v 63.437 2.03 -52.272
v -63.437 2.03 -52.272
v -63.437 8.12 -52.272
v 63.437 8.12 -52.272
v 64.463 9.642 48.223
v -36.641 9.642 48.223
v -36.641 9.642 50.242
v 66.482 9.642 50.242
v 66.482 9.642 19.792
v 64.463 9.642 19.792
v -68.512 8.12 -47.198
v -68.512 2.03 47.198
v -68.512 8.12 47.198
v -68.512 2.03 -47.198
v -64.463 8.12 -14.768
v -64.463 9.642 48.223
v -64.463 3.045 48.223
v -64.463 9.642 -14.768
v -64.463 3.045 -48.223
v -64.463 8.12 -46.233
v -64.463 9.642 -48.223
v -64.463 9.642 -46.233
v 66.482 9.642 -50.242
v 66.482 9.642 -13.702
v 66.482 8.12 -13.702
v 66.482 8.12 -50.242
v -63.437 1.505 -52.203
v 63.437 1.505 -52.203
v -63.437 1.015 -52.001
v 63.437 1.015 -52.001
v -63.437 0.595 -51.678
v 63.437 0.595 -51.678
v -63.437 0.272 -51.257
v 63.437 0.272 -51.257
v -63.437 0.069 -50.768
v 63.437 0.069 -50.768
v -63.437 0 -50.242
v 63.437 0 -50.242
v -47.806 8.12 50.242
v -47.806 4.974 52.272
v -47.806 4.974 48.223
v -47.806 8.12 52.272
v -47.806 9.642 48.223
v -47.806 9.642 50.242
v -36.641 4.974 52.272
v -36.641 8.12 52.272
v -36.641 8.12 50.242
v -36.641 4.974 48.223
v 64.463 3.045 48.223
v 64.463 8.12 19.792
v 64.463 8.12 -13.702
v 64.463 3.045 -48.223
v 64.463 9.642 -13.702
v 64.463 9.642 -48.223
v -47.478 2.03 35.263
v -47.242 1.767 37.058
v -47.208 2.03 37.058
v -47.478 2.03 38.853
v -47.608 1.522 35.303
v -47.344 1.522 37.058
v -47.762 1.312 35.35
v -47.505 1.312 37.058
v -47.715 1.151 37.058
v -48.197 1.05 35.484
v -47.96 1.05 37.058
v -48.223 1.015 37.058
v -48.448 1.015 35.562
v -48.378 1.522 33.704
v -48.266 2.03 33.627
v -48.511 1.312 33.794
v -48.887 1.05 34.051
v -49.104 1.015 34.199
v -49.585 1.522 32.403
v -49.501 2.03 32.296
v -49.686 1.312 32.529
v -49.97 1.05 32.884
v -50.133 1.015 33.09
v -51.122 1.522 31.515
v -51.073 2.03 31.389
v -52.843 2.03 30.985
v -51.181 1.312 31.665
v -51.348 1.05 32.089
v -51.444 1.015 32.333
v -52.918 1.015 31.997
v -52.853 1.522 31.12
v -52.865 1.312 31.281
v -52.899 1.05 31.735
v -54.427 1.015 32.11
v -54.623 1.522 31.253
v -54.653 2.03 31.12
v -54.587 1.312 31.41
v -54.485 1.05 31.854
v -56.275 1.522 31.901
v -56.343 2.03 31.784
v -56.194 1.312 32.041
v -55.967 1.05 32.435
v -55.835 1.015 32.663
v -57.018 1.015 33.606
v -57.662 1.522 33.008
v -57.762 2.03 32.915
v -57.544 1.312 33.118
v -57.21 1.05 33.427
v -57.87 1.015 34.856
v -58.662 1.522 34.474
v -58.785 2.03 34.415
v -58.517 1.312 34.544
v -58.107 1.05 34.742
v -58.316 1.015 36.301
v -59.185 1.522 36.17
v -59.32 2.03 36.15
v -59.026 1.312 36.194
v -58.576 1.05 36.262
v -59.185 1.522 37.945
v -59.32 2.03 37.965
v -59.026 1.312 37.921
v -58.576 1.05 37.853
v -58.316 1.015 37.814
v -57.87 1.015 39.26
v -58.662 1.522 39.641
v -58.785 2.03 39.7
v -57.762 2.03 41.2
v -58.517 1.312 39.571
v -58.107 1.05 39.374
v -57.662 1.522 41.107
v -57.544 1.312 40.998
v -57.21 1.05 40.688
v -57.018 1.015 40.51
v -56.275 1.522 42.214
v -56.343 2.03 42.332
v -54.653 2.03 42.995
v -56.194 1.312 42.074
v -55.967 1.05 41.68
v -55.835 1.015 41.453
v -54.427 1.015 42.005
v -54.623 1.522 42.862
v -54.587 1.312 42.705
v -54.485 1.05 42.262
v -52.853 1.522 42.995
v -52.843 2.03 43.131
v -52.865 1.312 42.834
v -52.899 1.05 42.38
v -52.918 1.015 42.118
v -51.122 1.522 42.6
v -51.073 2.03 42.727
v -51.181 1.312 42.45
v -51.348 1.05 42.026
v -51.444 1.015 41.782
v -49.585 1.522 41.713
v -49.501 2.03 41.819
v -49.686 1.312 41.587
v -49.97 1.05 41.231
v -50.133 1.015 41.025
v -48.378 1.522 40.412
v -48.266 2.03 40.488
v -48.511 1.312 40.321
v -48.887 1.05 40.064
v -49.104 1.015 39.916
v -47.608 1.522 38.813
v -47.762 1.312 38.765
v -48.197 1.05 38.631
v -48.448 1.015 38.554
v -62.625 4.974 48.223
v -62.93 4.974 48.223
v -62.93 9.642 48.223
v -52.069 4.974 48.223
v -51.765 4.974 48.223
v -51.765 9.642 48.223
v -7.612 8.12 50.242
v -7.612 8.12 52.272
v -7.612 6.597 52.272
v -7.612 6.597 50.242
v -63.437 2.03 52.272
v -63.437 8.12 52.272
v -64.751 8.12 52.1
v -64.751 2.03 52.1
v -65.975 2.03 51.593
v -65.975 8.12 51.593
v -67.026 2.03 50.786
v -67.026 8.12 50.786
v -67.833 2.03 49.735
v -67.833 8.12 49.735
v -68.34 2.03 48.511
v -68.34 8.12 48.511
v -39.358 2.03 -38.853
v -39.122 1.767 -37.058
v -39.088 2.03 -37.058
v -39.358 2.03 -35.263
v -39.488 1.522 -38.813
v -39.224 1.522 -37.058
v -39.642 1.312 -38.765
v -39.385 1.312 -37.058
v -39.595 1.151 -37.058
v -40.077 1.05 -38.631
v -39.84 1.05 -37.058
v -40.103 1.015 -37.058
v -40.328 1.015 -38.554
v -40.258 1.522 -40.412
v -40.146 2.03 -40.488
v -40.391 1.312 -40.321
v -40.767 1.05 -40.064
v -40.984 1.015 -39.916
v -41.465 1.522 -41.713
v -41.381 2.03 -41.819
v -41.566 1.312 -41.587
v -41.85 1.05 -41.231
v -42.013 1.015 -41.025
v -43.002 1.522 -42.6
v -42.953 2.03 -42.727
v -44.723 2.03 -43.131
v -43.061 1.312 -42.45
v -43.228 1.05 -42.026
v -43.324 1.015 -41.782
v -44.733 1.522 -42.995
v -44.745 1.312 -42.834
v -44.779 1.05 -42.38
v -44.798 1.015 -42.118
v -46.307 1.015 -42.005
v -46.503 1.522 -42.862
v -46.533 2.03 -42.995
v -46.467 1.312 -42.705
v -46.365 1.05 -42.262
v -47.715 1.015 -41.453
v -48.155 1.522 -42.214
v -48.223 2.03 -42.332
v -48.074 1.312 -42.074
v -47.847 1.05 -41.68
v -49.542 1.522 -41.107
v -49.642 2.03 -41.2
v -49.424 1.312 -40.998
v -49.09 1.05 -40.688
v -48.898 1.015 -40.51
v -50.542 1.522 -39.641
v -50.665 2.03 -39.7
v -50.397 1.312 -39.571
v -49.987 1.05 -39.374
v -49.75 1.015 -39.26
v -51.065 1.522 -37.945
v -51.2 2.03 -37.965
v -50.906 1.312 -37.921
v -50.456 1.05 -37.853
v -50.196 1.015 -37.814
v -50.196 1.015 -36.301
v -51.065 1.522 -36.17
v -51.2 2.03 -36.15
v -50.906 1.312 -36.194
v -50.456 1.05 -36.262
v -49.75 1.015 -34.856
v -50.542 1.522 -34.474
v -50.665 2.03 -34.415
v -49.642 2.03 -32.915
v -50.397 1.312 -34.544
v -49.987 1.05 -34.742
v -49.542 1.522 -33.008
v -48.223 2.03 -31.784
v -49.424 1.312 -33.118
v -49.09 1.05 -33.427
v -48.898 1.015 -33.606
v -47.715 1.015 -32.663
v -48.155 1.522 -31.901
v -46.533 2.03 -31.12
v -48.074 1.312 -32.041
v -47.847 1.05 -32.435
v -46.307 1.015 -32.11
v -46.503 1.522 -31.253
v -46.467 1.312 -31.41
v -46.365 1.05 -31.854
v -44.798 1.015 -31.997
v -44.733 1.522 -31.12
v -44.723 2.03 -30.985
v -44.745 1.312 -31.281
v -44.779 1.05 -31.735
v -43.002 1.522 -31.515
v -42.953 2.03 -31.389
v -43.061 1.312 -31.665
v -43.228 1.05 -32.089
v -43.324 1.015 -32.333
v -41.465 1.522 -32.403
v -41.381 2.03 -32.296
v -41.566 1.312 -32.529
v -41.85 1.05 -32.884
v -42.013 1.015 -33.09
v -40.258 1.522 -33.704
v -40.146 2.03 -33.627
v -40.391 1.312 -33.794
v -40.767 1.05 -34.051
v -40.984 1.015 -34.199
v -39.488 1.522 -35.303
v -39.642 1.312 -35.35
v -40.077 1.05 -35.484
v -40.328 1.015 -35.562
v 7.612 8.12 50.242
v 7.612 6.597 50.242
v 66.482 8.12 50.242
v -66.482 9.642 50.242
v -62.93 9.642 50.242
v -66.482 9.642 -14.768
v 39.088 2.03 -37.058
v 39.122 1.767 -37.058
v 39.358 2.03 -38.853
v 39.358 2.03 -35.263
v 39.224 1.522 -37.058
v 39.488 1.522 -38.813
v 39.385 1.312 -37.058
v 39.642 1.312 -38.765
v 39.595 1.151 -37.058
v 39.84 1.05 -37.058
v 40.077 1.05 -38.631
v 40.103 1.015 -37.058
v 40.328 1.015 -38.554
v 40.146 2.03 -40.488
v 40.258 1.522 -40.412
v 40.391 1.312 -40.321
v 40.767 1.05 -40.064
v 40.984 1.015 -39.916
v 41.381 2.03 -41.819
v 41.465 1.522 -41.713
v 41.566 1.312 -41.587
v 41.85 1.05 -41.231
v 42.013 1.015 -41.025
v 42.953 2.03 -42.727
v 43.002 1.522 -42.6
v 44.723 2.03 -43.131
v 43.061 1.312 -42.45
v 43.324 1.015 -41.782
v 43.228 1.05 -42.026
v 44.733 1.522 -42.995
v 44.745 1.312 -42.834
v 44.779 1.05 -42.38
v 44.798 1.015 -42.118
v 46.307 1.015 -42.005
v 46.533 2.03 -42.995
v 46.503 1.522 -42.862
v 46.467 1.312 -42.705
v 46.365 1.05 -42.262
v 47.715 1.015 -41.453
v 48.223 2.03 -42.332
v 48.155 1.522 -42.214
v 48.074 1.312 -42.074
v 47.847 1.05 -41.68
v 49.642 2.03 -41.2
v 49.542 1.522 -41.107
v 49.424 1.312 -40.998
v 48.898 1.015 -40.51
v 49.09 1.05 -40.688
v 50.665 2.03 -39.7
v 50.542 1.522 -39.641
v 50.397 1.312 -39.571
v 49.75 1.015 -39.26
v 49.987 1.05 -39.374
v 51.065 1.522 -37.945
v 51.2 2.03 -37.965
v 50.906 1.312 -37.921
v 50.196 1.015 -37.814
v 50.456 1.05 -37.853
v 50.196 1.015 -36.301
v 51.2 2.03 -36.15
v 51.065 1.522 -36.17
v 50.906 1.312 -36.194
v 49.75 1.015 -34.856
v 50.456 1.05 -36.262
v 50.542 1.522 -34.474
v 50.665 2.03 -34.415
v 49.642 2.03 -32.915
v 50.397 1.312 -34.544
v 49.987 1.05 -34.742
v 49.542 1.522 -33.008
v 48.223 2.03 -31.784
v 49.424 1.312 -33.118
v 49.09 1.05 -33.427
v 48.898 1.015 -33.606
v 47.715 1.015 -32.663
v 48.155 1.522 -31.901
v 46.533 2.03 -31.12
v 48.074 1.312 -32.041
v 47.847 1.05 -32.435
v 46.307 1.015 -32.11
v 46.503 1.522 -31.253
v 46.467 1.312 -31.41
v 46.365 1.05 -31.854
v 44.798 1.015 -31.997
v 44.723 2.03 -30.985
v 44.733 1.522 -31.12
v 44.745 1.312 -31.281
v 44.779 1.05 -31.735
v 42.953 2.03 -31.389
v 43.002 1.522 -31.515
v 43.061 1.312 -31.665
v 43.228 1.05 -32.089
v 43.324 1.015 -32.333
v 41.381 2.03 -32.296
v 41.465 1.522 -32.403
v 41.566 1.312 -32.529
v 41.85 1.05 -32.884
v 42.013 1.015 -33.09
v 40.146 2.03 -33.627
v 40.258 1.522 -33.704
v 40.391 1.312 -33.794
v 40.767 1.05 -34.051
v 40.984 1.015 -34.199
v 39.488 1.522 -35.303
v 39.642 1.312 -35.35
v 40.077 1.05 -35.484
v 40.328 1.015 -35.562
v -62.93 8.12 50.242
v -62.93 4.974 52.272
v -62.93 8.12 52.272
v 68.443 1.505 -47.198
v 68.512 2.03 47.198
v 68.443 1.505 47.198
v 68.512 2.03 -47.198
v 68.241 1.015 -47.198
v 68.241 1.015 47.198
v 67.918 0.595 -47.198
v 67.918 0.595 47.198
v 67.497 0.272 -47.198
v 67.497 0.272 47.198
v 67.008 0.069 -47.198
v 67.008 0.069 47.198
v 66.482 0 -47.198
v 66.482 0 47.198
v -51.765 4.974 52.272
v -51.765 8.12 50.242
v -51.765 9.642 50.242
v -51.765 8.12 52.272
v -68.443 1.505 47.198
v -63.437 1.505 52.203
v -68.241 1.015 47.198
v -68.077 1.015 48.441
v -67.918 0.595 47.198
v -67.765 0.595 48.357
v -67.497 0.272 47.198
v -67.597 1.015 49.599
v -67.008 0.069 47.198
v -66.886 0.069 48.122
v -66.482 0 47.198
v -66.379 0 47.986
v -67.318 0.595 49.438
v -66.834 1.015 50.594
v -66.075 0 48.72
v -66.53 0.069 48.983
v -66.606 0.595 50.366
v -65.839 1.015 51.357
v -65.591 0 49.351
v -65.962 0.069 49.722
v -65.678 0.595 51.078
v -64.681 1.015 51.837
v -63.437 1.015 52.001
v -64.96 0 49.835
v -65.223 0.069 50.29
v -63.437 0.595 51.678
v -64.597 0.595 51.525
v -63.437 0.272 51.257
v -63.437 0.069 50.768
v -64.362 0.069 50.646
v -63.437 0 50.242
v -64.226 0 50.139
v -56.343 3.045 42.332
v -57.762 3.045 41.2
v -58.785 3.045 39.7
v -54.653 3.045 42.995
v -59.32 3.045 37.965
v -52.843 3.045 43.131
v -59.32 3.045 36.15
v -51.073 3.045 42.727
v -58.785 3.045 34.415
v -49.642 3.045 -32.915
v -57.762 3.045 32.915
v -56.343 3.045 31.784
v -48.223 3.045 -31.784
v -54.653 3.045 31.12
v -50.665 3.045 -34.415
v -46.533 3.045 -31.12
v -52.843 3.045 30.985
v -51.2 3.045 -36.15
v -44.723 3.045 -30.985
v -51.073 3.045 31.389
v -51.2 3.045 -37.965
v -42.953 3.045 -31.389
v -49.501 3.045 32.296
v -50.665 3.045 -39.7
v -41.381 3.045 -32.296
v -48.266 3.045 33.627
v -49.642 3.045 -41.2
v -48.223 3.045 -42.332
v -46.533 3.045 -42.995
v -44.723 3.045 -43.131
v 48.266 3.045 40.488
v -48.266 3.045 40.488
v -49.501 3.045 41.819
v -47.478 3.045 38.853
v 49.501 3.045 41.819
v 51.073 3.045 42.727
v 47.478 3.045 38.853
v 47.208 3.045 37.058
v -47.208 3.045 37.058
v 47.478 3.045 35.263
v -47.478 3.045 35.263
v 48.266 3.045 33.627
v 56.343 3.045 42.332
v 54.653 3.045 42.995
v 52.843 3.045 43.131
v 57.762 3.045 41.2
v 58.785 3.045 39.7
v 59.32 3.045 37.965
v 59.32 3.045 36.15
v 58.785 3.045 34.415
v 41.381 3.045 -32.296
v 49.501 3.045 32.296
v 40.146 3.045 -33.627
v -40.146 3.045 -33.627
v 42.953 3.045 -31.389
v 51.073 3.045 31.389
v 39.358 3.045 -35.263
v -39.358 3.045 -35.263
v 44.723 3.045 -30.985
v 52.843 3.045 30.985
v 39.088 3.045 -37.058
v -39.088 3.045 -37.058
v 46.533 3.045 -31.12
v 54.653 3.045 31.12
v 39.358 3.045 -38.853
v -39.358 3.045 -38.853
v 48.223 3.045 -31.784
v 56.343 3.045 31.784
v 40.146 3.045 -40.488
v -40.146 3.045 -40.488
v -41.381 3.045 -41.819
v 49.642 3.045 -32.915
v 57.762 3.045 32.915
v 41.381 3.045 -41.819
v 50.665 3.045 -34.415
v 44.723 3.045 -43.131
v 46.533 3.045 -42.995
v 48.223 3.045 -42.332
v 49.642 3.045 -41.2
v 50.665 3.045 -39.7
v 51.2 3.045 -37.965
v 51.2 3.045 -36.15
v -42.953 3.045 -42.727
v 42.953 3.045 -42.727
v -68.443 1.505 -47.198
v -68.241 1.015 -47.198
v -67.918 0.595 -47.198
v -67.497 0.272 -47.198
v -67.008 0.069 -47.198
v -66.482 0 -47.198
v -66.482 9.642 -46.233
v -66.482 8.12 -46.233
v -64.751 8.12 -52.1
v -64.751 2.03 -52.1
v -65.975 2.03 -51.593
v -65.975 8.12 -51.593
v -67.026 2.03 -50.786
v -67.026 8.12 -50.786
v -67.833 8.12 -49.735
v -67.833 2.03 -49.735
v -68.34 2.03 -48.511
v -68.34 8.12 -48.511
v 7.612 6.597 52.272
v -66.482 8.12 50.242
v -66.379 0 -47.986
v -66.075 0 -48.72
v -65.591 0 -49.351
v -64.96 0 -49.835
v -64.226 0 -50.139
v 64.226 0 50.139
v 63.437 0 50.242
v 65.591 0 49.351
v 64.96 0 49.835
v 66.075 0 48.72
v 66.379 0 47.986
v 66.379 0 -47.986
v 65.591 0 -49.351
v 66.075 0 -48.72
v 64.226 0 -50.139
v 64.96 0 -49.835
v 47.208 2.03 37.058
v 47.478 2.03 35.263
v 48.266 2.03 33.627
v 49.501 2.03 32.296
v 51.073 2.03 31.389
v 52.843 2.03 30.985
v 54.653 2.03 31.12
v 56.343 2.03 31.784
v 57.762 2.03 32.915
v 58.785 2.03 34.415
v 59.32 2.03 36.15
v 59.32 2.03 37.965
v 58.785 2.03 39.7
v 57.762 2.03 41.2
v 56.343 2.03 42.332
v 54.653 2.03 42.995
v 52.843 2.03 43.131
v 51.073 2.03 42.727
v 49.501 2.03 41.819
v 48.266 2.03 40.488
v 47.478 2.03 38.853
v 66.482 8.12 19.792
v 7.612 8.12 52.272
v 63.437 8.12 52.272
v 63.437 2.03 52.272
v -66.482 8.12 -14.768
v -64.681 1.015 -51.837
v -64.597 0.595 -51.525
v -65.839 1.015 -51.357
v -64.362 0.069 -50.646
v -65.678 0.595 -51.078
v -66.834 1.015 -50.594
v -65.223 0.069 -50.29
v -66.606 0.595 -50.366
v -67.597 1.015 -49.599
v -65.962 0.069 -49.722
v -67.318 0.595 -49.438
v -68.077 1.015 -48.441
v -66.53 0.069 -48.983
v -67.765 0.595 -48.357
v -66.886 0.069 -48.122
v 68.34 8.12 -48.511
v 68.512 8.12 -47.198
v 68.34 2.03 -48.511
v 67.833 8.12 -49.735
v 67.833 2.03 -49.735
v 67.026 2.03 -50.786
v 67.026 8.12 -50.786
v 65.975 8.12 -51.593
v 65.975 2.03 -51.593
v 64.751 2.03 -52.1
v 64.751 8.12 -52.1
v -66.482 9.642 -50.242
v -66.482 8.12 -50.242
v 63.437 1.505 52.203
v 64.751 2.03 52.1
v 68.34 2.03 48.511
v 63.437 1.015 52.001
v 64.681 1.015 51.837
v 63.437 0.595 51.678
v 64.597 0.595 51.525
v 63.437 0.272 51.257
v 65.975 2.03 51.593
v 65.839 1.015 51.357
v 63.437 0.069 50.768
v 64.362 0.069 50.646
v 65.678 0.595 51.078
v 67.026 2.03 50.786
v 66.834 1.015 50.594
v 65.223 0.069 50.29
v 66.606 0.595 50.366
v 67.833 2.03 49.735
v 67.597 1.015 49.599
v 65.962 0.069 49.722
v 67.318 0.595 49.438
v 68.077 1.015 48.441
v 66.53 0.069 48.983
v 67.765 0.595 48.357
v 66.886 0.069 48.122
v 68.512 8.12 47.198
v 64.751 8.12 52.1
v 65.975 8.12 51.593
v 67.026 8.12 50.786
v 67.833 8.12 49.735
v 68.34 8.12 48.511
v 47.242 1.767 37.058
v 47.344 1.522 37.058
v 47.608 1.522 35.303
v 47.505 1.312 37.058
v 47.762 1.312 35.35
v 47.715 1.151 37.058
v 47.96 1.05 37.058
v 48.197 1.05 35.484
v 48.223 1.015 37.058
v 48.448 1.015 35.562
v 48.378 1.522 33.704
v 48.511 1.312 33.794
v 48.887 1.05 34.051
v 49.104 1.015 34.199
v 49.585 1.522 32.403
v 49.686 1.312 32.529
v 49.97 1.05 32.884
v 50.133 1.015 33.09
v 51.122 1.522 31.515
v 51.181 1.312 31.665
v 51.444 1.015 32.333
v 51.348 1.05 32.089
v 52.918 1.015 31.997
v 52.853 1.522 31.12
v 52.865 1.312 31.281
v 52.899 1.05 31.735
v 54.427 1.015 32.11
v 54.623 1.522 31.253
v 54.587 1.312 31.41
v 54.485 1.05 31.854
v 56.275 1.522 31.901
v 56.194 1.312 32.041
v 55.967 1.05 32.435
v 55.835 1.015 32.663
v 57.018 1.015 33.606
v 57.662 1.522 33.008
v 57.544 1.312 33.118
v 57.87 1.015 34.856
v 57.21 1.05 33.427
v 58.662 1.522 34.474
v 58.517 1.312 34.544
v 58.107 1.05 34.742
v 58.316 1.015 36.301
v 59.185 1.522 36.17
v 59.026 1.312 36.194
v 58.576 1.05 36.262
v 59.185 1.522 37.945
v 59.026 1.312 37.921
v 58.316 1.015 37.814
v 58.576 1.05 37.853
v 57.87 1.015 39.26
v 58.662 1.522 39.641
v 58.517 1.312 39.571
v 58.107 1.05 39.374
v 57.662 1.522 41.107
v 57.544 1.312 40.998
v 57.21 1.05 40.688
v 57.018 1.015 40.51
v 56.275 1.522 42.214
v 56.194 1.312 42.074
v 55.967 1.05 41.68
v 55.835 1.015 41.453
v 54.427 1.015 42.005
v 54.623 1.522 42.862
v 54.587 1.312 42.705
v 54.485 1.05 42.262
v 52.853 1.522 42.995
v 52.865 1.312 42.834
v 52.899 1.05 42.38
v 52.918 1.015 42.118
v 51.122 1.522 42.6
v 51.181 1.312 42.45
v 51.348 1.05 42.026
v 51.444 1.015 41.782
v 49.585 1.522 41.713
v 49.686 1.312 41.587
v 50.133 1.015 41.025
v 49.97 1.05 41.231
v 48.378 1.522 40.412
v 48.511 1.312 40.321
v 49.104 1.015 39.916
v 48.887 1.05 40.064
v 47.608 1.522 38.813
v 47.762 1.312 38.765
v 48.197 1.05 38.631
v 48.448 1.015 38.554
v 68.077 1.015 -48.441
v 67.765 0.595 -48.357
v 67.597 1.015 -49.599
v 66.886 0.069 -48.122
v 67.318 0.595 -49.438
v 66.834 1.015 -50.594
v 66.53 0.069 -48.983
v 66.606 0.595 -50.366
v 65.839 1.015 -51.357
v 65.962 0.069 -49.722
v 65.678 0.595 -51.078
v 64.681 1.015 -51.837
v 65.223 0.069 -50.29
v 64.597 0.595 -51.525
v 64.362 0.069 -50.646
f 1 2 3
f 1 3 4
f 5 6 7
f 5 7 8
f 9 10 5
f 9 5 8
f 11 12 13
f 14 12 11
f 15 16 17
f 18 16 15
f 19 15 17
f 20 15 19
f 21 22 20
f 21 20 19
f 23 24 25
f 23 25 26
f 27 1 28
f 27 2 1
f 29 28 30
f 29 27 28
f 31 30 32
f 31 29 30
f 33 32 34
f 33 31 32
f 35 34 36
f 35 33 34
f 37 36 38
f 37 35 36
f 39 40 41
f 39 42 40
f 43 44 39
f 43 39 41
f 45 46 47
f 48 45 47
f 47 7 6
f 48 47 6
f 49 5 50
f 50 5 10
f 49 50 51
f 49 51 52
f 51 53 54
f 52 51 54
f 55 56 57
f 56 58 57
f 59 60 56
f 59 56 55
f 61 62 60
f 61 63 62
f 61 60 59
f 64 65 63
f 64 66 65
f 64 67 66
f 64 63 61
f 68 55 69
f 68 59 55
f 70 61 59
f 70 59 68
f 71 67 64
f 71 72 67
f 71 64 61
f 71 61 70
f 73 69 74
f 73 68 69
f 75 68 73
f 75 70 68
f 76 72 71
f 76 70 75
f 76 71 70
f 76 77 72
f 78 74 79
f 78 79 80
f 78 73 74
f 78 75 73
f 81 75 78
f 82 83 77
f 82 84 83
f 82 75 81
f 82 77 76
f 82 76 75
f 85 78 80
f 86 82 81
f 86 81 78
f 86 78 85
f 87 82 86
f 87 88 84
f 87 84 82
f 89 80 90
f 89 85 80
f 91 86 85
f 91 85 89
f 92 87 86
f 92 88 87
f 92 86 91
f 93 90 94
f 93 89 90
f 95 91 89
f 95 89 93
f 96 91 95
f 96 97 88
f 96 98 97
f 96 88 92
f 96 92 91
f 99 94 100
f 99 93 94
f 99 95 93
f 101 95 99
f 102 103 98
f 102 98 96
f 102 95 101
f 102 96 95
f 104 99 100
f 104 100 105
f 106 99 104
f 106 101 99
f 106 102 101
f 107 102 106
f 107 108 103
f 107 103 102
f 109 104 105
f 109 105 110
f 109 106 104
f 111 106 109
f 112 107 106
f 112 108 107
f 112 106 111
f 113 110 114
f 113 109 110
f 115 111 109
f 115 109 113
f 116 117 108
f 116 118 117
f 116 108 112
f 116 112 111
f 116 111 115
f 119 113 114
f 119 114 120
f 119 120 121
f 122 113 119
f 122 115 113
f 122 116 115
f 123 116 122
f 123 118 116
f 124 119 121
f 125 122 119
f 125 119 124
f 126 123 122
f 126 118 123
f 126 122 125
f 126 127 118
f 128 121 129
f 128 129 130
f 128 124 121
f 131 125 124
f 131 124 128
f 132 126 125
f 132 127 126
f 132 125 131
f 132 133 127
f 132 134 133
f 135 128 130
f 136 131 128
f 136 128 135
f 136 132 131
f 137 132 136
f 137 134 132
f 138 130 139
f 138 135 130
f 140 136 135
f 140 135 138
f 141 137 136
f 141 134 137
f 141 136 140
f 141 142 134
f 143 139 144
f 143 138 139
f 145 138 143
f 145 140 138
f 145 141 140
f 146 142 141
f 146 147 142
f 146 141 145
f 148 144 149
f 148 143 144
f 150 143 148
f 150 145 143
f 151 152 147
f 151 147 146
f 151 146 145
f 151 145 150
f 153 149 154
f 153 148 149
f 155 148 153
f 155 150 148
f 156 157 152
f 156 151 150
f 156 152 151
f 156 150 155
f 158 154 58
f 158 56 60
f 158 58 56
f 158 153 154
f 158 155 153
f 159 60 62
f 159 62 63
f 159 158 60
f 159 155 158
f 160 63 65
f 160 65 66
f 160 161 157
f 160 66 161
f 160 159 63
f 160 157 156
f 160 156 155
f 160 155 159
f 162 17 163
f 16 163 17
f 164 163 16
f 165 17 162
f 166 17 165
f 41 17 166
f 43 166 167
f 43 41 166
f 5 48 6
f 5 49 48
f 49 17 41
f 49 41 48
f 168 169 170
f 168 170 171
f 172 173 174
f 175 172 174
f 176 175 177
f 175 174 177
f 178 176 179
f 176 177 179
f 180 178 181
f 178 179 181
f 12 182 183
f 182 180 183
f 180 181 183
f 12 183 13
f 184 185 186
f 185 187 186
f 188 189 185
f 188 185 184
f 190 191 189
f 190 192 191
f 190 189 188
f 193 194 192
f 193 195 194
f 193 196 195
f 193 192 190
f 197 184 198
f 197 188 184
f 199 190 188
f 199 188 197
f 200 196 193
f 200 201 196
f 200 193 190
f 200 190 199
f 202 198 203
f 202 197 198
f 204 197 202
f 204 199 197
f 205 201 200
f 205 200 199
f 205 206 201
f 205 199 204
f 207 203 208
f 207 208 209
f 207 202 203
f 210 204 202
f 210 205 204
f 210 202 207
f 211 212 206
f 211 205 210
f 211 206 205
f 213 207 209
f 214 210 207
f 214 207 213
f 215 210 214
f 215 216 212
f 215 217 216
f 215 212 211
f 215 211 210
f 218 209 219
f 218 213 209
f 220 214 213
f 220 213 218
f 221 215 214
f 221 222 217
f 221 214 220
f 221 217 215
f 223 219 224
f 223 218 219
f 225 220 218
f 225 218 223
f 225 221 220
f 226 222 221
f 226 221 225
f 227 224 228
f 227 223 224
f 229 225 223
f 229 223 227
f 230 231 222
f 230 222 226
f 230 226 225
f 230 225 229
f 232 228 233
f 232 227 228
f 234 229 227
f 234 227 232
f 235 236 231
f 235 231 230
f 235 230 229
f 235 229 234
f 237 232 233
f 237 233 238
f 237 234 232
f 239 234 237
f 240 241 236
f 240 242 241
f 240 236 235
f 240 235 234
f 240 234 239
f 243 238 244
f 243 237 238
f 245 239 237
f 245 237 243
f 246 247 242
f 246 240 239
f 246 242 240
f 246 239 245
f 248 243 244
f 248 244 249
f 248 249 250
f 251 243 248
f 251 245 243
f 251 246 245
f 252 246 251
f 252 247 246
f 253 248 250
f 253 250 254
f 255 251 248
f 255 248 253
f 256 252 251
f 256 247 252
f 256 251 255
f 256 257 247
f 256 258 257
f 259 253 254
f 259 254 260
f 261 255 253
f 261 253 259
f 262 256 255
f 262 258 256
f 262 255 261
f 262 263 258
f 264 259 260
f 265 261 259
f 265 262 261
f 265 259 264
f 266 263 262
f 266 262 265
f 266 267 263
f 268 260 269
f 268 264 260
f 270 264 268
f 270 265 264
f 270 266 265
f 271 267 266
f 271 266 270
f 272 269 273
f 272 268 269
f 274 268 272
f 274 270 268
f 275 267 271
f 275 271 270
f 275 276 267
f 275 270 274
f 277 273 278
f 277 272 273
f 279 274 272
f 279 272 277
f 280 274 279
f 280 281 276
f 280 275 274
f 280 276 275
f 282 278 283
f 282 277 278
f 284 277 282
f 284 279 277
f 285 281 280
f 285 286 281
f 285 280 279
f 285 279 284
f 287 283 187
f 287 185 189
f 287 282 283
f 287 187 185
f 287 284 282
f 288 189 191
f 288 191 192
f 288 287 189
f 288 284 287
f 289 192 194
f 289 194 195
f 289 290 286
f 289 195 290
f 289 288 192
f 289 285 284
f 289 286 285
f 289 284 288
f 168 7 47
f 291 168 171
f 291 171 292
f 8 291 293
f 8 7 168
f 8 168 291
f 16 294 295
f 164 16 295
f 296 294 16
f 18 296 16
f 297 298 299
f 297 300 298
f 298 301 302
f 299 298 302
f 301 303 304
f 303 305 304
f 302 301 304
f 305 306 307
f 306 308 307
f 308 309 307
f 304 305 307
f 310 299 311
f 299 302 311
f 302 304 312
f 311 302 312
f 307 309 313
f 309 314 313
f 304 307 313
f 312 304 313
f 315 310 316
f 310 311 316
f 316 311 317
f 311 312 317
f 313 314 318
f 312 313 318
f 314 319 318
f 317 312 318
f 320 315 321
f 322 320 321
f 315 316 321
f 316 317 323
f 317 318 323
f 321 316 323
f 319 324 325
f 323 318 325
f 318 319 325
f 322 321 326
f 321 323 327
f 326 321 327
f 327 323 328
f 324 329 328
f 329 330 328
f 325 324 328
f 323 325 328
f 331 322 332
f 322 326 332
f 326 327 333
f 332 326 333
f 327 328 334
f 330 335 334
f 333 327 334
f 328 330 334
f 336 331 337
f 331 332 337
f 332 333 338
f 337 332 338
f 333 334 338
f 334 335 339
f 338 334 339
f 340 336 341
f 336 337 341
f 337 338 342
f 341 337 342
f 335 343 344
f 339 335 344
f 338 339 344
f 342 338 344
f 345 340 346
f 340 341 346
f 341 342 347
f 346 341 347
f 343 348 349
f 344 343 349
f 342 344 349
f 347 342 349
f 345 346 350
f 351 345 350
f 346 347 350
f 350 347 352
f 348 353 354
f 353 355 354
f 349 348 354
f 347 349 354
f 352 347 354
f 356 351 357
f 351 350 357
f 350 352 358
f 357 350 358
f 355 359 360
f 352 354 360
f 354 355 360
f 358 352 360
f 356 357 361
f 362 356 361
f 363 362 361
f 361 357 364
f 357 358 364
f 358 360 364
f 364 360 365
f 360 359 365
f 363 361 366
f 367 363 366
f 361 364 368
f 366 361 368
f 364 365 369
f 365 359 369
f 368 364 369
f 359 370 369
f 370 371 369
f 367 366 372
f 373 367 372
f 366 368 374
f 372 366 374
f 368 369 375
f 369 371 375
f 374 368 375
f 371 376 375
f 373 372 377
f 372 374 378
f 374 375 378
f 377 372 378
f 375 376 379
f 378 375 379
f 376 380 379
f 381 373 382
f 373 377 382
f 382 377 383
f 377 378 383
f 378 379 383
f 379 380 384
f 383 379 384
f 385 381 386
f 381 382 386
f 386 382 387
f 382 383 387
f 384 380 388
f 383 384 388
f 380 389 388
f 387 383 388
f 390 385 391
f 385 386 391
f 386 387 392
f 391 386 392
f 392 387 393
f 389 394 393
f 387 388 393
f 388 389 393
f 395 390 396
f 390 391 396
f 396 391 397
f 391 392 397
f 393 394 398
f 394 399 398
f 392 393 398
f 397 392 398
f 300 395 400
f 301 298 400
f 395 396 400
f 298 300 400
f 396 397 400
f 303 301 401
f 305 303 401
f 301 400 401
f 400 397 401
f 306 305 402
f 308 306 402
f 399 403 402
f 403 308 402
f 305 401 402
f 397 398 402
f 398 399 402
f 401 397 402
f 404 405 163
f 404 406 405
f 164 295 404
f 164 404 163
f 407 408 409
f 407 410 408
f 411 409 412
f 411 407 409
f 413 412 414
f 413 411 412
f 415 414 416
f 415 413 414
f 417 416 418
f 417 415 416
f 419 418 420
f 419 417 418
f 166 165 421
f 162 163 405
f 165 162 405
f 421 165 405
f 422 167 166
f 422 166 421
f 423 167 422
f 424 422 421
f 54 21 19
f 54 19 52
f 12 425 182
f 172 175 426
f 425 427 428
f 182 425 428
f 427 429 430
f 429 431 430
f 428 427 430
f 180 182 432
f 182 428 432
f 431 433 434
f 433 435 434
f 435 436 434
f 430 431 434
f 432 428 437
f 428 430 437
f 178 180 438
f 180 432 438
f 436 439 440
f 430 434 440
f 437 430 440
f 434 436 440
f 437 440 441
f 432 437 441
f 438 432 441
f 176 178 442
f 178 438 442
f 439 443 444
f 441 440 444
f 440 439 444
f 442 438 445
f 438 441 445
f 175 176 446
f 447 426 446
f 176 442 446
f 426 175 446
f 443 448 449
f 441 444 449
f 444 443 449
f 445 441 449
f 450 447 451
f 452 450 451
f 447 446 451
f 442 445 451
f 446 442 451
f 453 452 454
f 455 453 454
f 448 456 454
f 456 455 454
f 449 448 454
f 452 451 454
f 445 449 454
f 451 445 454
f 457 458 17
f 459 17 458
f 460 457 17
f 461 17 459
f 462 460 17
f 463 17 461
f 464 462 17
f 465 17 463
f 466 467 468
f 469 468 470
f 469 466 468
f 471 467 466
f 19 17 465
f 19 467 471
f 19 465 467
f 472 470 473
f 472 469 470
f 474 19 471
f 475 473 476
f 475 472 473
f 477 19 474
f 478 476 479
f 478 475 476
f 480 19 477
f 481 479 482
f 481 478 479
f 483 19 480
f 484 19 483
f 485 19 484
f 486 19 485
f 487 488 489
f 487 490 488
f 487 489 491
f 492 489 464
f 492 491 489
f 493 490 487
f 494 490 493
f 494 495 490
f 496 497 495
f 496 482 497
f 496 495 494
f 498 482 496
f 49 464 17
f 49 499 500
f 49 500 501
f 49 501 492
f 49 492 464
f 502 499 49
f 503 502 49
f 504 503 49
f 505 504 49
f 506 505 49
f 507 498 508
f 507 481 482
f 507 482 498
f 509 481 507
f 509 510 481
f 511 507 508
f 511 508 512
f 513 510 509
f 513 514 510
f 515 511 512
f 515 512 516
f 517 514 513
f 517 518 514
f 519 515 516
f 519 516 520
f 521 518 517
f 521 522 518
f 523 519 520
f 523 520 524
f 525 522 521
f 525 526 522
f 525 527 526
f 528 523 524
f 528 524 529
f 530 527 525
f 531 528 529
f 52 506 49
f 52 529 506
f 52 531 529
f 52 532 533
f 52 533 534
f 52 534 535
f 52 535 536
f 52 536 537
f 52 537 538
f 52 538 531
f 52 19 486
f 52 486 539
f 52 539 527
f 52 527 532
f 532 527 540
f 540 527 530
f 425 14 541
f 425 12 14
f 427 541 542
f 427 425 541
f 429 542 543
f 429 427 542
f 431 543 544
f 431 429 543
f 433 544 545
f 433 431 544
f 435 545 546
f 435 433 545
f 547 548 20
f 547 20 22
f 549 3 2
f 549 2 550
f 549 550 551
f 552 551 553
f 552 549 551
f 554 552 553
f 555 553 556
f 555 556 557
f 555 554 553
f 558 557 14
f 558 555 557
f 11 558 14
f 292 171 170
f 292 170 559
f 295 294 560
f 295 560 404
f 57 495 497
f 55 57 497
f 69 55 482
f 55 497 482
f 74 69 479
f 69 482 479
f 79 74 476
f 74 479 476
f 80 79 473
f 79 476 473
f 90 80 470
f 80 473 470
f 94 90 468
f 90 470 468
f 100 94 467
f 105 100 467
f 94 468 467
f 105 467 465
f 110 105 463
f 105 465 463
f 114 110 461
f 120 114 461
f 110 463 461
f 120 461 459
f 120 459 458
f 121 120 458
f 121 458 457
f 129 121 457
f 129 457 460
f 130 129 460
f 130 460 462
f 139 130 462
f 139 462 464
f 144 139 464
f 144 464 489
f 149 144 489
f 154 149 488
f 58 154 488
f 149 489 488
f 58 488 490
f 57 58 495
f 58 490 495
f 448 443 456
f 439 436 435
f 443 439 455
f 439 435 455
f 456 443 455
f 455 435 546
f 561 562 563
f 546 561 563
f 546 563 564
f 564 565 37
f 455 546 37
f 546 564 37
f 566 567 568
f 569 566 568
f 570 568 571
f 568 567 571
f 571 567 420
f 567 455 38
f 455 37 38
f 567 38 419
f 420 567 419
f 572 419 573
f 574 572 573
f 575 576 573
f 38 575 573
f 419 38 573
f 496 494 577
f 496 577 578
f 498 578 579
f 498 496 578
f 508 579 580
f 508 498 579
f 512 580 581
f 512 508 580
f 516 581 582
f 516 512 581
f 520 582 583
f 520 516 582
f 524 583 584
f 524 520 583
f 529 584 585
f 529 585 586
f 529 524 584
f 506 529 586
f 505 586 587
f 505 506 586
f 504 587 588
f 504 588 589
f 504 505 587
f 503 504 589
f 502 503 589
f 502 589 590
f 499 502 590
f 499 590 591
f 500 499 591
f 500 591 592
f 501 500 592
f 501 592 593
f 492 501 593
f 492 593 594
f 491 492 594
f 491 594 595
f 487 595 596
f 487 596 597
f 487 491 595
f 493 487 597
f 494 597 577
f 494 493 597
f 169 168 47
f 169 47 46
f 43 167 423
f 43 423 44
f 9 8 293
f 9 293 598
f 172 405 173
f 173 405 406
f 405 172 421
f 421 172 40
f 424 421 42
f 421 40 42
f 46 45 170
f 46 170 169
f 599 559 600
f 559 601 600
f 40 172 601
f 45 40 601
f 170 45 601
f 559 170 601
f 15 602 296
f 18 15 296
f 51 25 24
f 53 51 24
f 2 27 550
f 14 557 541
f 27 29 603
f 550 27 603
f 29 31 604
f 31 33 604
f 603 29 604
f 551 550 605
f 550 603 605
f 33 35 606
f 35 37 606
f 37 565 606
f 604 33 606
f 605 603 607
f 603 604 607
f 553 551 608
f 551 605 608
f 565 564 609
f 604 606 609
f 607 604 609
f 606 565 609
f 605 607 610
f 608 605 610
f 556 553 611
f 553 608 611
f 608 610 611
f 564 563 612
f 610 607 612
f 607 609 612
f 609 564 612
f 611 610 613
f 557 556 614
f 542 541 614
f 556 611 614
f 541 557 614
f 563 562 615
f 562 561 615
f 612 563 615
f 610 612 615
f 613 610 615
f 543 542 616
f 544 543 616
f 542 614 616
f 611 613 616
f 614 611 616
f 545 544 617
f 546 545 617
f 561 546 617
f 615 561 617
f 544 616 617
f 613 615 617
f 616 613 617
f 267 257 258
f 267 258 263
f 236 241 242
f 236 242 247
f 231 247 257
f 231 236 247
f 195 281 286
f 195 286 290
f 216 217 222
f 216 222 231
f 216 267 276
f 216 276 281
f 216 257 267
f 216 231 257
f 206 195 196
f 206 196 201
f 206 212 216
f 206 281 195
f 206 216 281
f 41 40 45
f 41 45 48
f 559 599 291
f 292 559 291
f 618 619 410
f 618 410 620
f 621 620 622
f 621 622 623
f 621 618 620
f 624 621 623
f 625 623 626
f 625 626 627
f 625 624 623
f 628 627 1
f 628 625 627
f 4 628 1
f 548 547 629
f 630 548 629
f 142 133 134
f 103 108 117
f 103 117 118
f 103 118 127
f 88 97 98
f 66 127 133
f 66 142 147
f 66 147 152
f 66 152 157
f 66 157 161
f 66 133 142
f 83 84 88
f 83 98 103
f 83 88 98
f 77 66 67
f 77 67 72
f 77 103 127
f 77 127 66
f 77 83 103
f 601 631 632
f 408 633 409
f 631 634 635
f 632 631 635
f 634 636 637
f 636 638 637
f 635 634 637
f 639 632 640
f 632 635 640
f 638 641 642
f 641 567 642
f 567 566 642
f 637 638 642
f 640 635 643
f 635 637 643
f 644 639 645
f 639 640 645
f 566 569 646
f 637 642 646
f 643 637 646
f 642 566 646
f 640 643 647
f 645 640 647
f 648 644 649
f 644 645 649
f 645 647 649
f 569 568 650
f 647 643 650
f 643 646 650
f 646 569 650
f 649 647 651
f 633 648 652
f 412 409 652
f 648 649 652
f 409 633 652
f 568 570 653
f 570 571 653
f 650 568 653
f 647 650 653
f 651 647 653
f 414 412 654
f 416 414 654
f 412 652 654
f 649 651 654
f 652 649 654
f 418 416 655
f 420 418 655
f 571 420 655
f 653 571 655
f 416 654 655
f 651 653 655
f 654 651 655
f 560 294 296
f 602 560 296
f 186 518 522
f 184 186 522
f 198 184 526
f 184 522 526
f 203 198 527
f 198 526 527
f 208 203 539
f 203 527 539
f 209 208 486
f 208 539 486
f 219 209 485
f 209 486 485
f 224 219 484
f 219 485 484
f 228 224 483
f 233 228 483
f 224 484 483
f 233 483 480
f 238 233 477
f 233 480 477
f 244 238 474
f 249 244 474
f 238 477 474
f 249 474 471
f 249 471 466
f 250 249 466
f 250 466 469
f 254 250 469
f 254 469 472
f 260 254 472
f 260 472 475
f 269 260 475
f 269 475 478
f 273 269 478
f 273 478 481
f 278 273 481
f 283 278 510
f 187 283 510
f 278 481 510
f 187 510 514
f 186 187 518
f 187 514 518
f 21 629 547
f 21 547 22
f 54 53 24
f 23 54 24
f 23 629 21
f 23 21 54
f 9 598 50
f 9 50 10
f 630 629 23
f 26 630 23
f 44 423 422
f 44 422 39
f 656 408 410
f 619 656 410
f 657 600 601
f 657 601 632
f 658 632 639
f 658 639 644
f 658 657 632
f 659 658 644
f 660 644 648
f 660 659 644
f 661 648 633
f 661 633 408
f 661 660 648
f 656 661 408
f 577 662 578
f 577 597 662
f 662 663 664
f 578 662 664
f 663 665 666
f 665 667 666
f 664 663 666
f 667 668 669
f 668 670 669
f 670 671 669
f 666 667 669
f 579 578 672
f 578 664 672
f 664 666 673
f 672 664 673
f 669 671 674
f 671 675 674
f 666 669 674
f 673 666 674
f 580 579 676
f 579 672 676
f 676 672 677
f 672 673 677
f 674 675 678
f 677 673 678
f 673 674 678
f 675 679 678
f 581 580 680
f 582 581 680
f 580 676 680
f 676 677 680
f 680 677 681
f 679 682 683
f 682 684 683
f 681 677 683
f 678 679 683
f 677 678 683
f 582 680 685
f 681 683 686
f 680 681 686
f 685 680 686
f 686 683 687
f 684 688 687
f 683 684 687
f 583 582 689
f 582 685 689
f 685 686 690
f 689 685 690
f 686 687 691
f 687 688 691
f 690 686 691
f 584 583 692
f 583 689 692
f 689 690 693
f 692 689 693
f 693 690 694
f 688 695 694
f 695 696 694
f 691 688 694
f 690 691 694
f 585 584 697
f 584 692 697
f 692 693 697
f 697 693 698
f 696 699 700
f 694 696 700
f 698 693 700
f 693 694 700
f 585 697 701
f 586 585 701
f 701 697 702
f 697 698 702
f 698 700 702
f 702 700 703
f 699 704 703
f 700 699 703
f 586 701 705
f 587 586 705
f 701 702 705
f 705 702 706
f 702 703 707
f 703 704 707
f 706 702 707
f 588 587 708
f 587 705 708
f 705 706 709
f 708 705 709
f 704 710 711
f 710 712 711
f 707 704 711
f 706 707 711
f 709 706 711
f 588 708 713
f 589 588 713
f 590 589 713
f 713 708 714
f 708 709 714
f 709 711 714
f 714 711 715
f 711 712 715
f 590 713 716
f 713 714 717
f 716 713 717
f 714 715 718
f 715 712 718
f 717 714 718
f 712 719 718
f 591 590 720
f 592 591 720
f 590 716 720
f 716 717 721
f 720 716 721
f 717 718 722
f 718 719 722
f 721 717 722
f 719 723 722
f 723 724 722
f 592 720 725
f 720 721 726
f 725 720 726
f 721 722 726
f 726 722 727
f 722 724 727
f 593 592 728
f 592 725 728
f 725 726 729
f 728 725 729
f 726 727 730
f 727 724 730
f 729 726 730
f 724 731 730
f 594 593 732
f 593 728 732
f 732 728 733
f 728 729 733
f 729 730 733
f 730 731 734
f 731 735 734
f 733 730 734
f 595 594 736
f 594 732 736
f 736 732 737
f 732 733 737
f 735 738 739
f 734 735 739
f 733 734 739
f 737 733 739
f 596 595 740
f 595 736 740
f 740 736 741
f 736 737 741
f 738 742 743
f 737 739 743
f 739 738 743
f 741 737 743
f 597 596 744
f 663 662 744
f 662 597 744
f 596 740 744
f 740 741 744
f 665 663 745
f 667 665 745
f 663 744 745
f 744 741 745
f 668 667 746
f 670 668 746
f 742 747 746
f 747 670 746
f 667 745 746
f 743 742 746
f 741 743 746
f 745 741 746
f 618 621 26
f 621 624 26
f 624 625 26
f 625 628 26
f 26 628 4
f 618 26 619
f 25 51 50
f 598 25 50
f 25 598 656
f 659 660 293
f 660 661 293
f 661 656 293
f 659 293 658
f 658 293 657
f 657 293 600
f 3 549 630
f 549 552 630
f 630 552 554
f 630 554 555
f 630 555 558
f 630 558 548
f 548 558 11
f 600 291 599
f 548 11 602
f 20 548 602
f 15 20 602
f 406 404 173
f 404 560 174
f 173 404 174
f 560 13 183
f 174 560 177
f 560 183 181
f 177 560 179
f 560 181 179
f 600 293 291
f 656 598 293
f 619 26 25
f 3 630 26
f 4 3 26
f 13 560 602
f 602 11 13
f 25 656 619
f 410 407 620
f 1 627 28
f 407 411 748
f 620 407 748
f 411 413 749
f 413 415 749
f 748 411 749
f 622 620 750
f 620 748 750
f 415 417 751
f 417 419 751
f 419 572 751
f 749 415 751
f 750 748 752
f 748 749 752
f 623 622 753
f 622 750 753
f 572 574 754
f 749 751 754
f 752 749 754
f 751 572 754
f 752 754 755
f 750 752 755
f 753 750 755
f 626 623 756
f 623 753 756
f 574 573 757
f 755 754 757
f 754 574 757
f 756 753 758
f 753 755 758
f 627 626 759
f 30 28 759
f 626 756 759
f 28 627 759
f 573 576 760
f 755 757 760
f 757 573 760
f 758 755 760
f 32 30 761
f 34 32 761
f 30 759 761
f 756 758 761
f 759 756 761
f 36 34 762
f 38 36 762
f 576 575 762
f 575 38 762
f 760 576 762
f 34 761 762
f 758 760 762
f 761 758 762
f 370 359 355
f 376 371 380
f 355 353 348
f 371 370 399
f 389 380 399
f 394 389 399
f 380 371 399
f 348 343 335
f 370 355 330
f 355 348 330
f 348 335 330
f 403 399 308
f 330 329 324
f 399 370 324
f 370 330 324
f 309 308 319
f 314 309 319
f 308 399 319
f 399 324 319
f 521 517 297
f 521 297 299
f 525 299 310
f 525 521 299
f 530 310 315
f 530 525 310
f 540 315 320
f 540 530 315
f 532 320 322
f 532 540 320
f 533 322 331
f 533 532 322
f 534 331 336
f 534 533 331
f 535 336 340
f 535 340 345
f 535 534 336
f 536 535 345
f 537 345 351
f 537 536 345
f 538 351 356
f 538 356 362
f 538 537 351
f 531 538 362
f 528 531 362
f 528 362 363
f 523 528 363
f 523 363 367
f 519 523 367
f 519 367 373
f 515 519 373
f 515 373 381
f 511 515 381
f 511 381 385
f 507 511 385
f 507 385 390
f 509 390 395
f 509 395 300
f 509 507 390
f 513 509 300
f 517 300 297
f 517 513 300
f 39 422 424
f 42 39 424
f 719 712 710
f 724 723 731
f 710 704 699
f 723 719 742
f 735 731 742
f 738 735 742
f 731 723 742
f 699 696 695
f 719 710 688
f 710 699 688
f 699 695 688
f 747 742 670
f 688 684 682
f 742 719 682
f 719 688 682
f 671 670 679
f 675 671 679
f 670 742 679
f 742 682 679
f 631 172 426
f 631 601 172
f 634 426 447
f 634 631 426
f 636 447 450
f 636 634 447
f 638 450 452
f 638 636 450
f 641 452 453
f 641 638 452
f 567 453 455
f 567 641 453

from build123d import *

# Parameters (mm, degrees)
SKETCH1_W                                      = 135
SKETCH1_H                                      = 103
BOSS_EXTRUDE1_DEPTH                            = 13
SKETCH2_W                                      = 127.02
SKETCH2_H                                      = 95.02
CUT_EXTRUDE1_DEPTH                             = 10
SKETCH3_R                                      = 6
CUT_EXTRUDE2_DEPTH                             = 2
FILLET1_R                                      = 1
FILLET1_OF_MIRROR1_R                           = 1
SKETCH4_R                                      = 6
CUT_EXTRUDE3_DEPTH                             = 2
FILLET2_R                                      = 1
FILLET2_OF_MIRROR2_R                           = 1
SKETCH5_W                                      = 31
SKETCH5_H                                      = 2.5
CUT_EXTRUDE4_DEPTH                             = 5
SKETCH6_W                                      = 135
SKETCH6_H                                      = 103
CUT_EXTRUDE5_DEPTH                             = 3.5
SKETCH7_W                                      = 33
SKETCH7_H                                      = 12
CUT_EXTRUDE6_DEPTH                             = 5
SKETCH8_OUTSIDE_W                              = 171.014
SKETCH8_OUTSIDE_H                              = 139.014
SKETCH8_OUTSIDE_W_2                            = 131
SKETCH8_OUTSIDE_H_2                            = 99
CUT_AROUND_SIDE_FOR_FRICTION_FITTING_COV_DEPTH = 1.5
SKETCH9_W                                      = 15
SKETCH9_H                                      = 2
CUT_EXTRUDE8_DEPTH                             = 1.5
FILLET3_R                                      = 5
FILLET4_R                                      = 2
SKETCH14_W                                     = 8.2
SKETCH14_H                                     = 1.5
CUT_EXTRUDE13_DEPTH                            = 4
SKETCH16_W                                     = 8.2
SKETCH16_H                                     = 1.5
CUT_EXTRUDE14_DEPTH                            = 4
SKETCH17_W                                     = 1.99
SKETCH17_H                                     = 1.5
CUT_EXTRUDE15_DEPTH                            = 9.3
CUT_EXTRUDE15_DEPTH_BACK                       = 1.1
SKETCH18_W                                     = 1.99
SKETCH18_H                                     = 1.5
CUT_EXTRUDE16_DEPTH                            = 9.3
CUT_EXTRUDE16_DEPTH_BACK                       = 1.1
SKETCH19_W                                     = 10.4
SKETCH19_H                                     = 4.692472087
SKETCH19_W_2                                   = 10.469305177
SKETCH19_H_2                                   = 5.245813632
CUT_EXTRUDE17_DEPTH                            = 3.1
SKETCH23_W                                     = 3.99
SKETCH23_H                                     = 3.1
BOSS_EXTRUDE2_DEPTH                            = 0.069305
CUT_EXTRUDE20_DEPTH                            = 0.2
CUT_EXTRUDE21_DEPTH                            = 0.4
CUT_EXTRUDE22_DEPTH                            = 0.3
CUT_EXTRUDE23_DEPTH                            = 0.3
SCALE1_SCALE                                   = 1.015


with BuildPart() as part:
    # Sketch1 → Boss-Extrude1 (new body)
    with BuildSketch(Plane(origin=(0, 0, 0), x_dir=(1, 0, 0), z_dir=(0, 1, 0))):
        Rectangle(SKETCH1_W, SKETCH1_H)
    extrude(amount=BOSS_EXTRUDE1_DEPTH)

    # Sketch2 → Cut-Extrude1 (cut)
    with BuildSketch(Plane(origin=(0, 13, 0), x_dir=(1, 0, 0), z_dir=(0, 1, 0))):
        Rectangle(SKETCH2_W, SKETCH2_H)
    extrude(amount=-CUT_EXTRUDE1_DEPTH, mode=Mode.SUBTRACT)

    # Sketch3 → Cut-Extrude2 (cut)
    with BuildSketch(Plane(origin=(0, 3, 0), x_dir=(1, 0, 0), z_dir=(0, 1, 0))):
        with Locations((-52.51, -36.51)):
            Circle(SKETCH3_R)
    cut_extrude2 = extrude(amount=-CUT_EXTRUDE2_DEPTH, mode=Mode.SUBTRACT)

    # Fillet1
    fillet1_edges = [part.edges().sort_by_distance(p)[0] for p in [
        (-58.51, 1, 36.51),
    ]]
    fillet(fillet1_edges, radius=FILLET1_R)

    # Mirror1: Cut-Extrude2 across plane
    add(cut_extrude2.mirror(Plane(origin=(0, 0, 0), x_dir=(0, 0, 1), z_dir=(1, 0, 0))), mode=Mode.SUBTRACT)

    # Fillet1 of Mirror1
    fillet1_of_mirror1_edges = [part.edges().sort_by_distance(p)[0] for p in [
        (58.51, 1, 36.51),
    ]]
    fillet(fillet1_of_mirror1_edges, radius=FILLET1_OF_MIRROR1_R)

    # Sketch4 → Cut-Extrude3 (cut)
    with BuildSketch(Plane(origin=(0, 3, 0), x_dir=(1, 0, 0), z_dir=(0, 1, 0))):
        with Locations((-44.51, 36.51)):
            Circle(SKETCH4_R)
    cut_extrude3 = extrude(amount=-CUT_EXTRUDE3_DEPTH, mode=Mode.SUBTRACT)

    # Fillet2
    fillet2_edges = [part.edges().sort_by_distance(p)[0] for p in [
        (-50.51, 1, -36.51),
    ]]
    fillet(fillet2_edges, radius=FILLET2_R)

    # Mirror2: Cut-Extrude3 across plane
    add(cut_extrude3.mirror(Plane(origin=(0, 0, 0), x_dir=(0, 0, 1), z_dir=(1, 0, 0))), mode=Mode.SUBTRACT)

    # Fillet2 of Mirror2
    fillet2_of_mirror2_edges = [part.edges().sort_by_distance(p)[0] for p in [
        (50.51, 1, -36.51),
    ]]
    fillet(fillet2_of_mirror2_edges, radius=FILLET2_OF_MIRROR2_R)

    # Sketch5 → Cut-Extrude4 (cut)
    with BuildSketch(Plane.ZY.offset(67.5)):
        with Locations((-30.05, 9.25)):
            Rectangle(SKETCH5_W, SKETCH5_H)
    extrude(amount=-CUT_EXTRUDE4_DEPTH, mode=Mode.SUBTRACT)

    # Sketch6 → Cut-Extrude5 (cut)
    with BuildSketch(Plane(origin=(0, 13, 0), x_dir=(1, 0, 0), z_dir=(0, 1, 0))):
        Rectangle(SKETCH6_W, SKETCH6_H)
    extrude(amount=-CUT_EXTRUDE5_DEPTH, mode=Mode.SUBTRACT)

    # Sketch7 → Cut-Extrude6 (cut)
    with BuildSketch(Plane(origin=(67.5, 0, 0), x_dir=(0, 0, -1), z_dir=(1, 0, 0))):
        with Locations((-3, 14)):
            Rectangle(SKETCH7_W, SKETCH7_H)
    extrude(amount=-CUT_EXTRUDE6_DEPTH, mode=Mode.SUBTRACT)

    # Sketch8 outside → Cut Around side for friction fitting cover (cut)
    with BuildSketch(Plane(origin=(0, 9.5, 0), x_dir=(1, 0, 0), z_dir=(0, 1, 0))):
        Rectangle(SKETCH8_OUTSIDE_W, SKETCH8_OUTSIDE_H)
        Rectangle(SKETCH8_OUTSIDE_W_2, SKETCH8_OUTSIDE_H_2, mode=Mode.SUBTRACT)
    extrude(amount=-CUT_AROUND_SIDE_FOR_FRICTION_FITTING_COV_DEPTH, mode=Mode.SUBTRACT)

    # Sketch9 → Cut-Extrude8 (cut)
    with BuildSketch(Plane(origin=(0, 8, 0), x_dir=(1, 0, 0), z_dir=(0, 1, 0))):
        with Locations((0, -50.5)):
            Rectangle(SKETCH9_W, SKETCH9_H)
    extrude(amount=-CUT_EXTRUDE8_DEPTH, mode=Mode.SUBTRACT)

    # Fillet3
    fillet3_edges = [part.edges().sort_by_distance(p)[0] for p in [
        (67.5, 4, 51.5),
        (-67.5, 4, 51.5),
        (-67.5, 4, -51.5),
        (67.5, 4, -51.5),
    ]]
    fillet(fillet3_edges, radius=FILLET3_R)

    # Fillet4
    fillet4_edges = [part.edges().sort_by_distance(p)[0] for p in [
        (67.5, 0, 0),
        (0, 0, 51.5),
        (-67.5, 0, 0),
        (0, 0, -51.5),
        (-66.035533906, 0, 50.035533906),
        (-66.035533906, 0, -50.035533906),
        (66.035533906, 0, -50.035533906),
        (66.035533906, 0, 50.035533906),
    ]]
    fillet(fillet4_edges, radius=FILLET4_R)

    # Sketch14 → Cut-Extrude13 (cut)
    with BuildSketch(Plane.XY.offset(49.5)):
        with Locations((-56.5, 8.75)):
            Rectangle(SKETCH14_W, SKETCH14_H)
    extrude(amount=-CUT_EXTRUDE13_DEPTH, mode=Mode.SUBTRACT)

    # Sketch16 → Cut-Extrude14 (cut)
    with BuildSketch(Plane.XY.offset(49.5)):
        with Locations((-41.5, 8.75)):
            Rectangle(SKETCH16_W, SKETCH16_H)
    extrude(amount=-CUT_EXTRUDE14_DEPTH, mode=Mode.SUBTRACT)

    # Sketch17 → Cut-Extrude15 (cut, two sides)
    with BuildSketch(Plane(origin=(-60.6, 0, 0), x_dir=(0, 0, -1), z_dir=(1, 0, 0))) as cut_extrude15_sk:
        with Locations((-48.505, 8.75)):
            Rectangle(SKETCH17_W, SKETCH17_H)
    extrude(amount=CUT_EXTRUDE15_DEPTH, mode=Mode.SUBTRACT)
    extrude(cut_extrude15_sk.sketch, amount=-CUT_EXTRUDE15_DEPTH_BACK, mode=Mode.SUBTRACT)

    # Sketch18 → Cut-Extrude16 (cut, two sides)
    with BuildSketch(Plane(origin=(-45.6, 0, 0), x_dir=(0, 0, -1), z_dir=(1, 0, 0))) as cut_extrude16_sk:
        with Locations((-48.505, 8.75)):
            Rectangle(SKETCH18_W, SKETCH18_H)
    extrude(amount=CUT_EXTRUDE16_DEPTH, mode=Mode.SUBTRACT)
    extrude(cut_extrude16_sk.sketch, amount=-CUT_EXTRUDE16_DEPTH_BACK, mode=Mode.SUBTRACT)

    # Sketch19 → Cut-Extrude17 (cut)
    with BuildSketch(Plane(origin=(0, 8, 0), x_dir=(1, 0, 0), z_dir=(0, 1, 0))):
        with Locations((-56.5, -49.856236044)):
            Rectangle(SKETCH19_W, SKETCH19_H)
        with Locations((-41.465347412, -50.132906816)):
            Rectangle(SKETCH19_W_2, SKETCH19_H_2)
    extrude(amount=-CUT_EXTRUDE17_DEPTH, mode=Mode.SUBTRACT)

    # Sketch23 → Boss-Extrude2 (add)
    with BuildSketch(Plane.ZY.offset(36.230694823)):
        with Locations((49.505, 6.45)):
            Rectangle(SKETCH23_W, SKETCH23_H)
    extrude(amount=BOSS_EXTRUDE2_DEPTH)

    # Sketch24 → Cut-Extrude20 (cut)
    with BuildSketch(Plane.ZY.offset(36.3)):
        Polygon((47.51, 4.9), (47.51, 9.5), (49.5, 9.5), (49.5, 8), (51.5, 8), (51.5, 4.9), align=None)
    extrude(amount=-CUT_EXTRUDE20_DEPTH, mode=Mode.SUBTRACT)

    # Sketch25 → Cut-Extrude21 (cut)
    with BuildSketch(Plane(origin=(-46.7, 0, 0), x_dir=(0, 0, -1), z_dir=(1, 0, 0))):
        Polygon((-51.5, 4.9), (-47.51, 4.9), (-47.51, 9.5), (-49.5, 9.5), (-49.5, 8), (-51.5, 8), align=None)
    extrude(amount=-CUT_EXTRUDE21_DEPTH, mode=Mode.SUBTRACT)

    # Sketch26 → Cut-Extrude22 (cut)
    with BuildSketch(Plane.ZY.offset(51.3)):
        Polygon((47.51, 9.5), (47.51, 4.9), (51.5, 4.9), (51.5, 8), (49.5, 8), (49.5, 9.5), align=None)
    extrude(amount=-CUT_EXTRUDE22_DEPTH, mode=Mode.SUBTRACT)

    # Sketch27 → Cut-Extrude23 (cut)
    with BuildSketch(Plane(origin=(-61.7, 0, 0), x_dir=(0, 0, -1), z_dir=(1, 0, 0))):
        Polygon((-51.5, 4.9), (-47.51, 4.9), (-47.51, 9.5), (-49.5, 9.5), (-49.5, 8), (-51.5, 8), align=None)
    extrude(amount=-CUT_EXTRUDE23_DEPTH, mode=Mode.SUBTRACT)


with BuildPart() as part_1:
    # Scale1: scaled about (0, 0, 0)
    add(part.part.scale(SCALE1_SCALE))


solid = part_1.part
